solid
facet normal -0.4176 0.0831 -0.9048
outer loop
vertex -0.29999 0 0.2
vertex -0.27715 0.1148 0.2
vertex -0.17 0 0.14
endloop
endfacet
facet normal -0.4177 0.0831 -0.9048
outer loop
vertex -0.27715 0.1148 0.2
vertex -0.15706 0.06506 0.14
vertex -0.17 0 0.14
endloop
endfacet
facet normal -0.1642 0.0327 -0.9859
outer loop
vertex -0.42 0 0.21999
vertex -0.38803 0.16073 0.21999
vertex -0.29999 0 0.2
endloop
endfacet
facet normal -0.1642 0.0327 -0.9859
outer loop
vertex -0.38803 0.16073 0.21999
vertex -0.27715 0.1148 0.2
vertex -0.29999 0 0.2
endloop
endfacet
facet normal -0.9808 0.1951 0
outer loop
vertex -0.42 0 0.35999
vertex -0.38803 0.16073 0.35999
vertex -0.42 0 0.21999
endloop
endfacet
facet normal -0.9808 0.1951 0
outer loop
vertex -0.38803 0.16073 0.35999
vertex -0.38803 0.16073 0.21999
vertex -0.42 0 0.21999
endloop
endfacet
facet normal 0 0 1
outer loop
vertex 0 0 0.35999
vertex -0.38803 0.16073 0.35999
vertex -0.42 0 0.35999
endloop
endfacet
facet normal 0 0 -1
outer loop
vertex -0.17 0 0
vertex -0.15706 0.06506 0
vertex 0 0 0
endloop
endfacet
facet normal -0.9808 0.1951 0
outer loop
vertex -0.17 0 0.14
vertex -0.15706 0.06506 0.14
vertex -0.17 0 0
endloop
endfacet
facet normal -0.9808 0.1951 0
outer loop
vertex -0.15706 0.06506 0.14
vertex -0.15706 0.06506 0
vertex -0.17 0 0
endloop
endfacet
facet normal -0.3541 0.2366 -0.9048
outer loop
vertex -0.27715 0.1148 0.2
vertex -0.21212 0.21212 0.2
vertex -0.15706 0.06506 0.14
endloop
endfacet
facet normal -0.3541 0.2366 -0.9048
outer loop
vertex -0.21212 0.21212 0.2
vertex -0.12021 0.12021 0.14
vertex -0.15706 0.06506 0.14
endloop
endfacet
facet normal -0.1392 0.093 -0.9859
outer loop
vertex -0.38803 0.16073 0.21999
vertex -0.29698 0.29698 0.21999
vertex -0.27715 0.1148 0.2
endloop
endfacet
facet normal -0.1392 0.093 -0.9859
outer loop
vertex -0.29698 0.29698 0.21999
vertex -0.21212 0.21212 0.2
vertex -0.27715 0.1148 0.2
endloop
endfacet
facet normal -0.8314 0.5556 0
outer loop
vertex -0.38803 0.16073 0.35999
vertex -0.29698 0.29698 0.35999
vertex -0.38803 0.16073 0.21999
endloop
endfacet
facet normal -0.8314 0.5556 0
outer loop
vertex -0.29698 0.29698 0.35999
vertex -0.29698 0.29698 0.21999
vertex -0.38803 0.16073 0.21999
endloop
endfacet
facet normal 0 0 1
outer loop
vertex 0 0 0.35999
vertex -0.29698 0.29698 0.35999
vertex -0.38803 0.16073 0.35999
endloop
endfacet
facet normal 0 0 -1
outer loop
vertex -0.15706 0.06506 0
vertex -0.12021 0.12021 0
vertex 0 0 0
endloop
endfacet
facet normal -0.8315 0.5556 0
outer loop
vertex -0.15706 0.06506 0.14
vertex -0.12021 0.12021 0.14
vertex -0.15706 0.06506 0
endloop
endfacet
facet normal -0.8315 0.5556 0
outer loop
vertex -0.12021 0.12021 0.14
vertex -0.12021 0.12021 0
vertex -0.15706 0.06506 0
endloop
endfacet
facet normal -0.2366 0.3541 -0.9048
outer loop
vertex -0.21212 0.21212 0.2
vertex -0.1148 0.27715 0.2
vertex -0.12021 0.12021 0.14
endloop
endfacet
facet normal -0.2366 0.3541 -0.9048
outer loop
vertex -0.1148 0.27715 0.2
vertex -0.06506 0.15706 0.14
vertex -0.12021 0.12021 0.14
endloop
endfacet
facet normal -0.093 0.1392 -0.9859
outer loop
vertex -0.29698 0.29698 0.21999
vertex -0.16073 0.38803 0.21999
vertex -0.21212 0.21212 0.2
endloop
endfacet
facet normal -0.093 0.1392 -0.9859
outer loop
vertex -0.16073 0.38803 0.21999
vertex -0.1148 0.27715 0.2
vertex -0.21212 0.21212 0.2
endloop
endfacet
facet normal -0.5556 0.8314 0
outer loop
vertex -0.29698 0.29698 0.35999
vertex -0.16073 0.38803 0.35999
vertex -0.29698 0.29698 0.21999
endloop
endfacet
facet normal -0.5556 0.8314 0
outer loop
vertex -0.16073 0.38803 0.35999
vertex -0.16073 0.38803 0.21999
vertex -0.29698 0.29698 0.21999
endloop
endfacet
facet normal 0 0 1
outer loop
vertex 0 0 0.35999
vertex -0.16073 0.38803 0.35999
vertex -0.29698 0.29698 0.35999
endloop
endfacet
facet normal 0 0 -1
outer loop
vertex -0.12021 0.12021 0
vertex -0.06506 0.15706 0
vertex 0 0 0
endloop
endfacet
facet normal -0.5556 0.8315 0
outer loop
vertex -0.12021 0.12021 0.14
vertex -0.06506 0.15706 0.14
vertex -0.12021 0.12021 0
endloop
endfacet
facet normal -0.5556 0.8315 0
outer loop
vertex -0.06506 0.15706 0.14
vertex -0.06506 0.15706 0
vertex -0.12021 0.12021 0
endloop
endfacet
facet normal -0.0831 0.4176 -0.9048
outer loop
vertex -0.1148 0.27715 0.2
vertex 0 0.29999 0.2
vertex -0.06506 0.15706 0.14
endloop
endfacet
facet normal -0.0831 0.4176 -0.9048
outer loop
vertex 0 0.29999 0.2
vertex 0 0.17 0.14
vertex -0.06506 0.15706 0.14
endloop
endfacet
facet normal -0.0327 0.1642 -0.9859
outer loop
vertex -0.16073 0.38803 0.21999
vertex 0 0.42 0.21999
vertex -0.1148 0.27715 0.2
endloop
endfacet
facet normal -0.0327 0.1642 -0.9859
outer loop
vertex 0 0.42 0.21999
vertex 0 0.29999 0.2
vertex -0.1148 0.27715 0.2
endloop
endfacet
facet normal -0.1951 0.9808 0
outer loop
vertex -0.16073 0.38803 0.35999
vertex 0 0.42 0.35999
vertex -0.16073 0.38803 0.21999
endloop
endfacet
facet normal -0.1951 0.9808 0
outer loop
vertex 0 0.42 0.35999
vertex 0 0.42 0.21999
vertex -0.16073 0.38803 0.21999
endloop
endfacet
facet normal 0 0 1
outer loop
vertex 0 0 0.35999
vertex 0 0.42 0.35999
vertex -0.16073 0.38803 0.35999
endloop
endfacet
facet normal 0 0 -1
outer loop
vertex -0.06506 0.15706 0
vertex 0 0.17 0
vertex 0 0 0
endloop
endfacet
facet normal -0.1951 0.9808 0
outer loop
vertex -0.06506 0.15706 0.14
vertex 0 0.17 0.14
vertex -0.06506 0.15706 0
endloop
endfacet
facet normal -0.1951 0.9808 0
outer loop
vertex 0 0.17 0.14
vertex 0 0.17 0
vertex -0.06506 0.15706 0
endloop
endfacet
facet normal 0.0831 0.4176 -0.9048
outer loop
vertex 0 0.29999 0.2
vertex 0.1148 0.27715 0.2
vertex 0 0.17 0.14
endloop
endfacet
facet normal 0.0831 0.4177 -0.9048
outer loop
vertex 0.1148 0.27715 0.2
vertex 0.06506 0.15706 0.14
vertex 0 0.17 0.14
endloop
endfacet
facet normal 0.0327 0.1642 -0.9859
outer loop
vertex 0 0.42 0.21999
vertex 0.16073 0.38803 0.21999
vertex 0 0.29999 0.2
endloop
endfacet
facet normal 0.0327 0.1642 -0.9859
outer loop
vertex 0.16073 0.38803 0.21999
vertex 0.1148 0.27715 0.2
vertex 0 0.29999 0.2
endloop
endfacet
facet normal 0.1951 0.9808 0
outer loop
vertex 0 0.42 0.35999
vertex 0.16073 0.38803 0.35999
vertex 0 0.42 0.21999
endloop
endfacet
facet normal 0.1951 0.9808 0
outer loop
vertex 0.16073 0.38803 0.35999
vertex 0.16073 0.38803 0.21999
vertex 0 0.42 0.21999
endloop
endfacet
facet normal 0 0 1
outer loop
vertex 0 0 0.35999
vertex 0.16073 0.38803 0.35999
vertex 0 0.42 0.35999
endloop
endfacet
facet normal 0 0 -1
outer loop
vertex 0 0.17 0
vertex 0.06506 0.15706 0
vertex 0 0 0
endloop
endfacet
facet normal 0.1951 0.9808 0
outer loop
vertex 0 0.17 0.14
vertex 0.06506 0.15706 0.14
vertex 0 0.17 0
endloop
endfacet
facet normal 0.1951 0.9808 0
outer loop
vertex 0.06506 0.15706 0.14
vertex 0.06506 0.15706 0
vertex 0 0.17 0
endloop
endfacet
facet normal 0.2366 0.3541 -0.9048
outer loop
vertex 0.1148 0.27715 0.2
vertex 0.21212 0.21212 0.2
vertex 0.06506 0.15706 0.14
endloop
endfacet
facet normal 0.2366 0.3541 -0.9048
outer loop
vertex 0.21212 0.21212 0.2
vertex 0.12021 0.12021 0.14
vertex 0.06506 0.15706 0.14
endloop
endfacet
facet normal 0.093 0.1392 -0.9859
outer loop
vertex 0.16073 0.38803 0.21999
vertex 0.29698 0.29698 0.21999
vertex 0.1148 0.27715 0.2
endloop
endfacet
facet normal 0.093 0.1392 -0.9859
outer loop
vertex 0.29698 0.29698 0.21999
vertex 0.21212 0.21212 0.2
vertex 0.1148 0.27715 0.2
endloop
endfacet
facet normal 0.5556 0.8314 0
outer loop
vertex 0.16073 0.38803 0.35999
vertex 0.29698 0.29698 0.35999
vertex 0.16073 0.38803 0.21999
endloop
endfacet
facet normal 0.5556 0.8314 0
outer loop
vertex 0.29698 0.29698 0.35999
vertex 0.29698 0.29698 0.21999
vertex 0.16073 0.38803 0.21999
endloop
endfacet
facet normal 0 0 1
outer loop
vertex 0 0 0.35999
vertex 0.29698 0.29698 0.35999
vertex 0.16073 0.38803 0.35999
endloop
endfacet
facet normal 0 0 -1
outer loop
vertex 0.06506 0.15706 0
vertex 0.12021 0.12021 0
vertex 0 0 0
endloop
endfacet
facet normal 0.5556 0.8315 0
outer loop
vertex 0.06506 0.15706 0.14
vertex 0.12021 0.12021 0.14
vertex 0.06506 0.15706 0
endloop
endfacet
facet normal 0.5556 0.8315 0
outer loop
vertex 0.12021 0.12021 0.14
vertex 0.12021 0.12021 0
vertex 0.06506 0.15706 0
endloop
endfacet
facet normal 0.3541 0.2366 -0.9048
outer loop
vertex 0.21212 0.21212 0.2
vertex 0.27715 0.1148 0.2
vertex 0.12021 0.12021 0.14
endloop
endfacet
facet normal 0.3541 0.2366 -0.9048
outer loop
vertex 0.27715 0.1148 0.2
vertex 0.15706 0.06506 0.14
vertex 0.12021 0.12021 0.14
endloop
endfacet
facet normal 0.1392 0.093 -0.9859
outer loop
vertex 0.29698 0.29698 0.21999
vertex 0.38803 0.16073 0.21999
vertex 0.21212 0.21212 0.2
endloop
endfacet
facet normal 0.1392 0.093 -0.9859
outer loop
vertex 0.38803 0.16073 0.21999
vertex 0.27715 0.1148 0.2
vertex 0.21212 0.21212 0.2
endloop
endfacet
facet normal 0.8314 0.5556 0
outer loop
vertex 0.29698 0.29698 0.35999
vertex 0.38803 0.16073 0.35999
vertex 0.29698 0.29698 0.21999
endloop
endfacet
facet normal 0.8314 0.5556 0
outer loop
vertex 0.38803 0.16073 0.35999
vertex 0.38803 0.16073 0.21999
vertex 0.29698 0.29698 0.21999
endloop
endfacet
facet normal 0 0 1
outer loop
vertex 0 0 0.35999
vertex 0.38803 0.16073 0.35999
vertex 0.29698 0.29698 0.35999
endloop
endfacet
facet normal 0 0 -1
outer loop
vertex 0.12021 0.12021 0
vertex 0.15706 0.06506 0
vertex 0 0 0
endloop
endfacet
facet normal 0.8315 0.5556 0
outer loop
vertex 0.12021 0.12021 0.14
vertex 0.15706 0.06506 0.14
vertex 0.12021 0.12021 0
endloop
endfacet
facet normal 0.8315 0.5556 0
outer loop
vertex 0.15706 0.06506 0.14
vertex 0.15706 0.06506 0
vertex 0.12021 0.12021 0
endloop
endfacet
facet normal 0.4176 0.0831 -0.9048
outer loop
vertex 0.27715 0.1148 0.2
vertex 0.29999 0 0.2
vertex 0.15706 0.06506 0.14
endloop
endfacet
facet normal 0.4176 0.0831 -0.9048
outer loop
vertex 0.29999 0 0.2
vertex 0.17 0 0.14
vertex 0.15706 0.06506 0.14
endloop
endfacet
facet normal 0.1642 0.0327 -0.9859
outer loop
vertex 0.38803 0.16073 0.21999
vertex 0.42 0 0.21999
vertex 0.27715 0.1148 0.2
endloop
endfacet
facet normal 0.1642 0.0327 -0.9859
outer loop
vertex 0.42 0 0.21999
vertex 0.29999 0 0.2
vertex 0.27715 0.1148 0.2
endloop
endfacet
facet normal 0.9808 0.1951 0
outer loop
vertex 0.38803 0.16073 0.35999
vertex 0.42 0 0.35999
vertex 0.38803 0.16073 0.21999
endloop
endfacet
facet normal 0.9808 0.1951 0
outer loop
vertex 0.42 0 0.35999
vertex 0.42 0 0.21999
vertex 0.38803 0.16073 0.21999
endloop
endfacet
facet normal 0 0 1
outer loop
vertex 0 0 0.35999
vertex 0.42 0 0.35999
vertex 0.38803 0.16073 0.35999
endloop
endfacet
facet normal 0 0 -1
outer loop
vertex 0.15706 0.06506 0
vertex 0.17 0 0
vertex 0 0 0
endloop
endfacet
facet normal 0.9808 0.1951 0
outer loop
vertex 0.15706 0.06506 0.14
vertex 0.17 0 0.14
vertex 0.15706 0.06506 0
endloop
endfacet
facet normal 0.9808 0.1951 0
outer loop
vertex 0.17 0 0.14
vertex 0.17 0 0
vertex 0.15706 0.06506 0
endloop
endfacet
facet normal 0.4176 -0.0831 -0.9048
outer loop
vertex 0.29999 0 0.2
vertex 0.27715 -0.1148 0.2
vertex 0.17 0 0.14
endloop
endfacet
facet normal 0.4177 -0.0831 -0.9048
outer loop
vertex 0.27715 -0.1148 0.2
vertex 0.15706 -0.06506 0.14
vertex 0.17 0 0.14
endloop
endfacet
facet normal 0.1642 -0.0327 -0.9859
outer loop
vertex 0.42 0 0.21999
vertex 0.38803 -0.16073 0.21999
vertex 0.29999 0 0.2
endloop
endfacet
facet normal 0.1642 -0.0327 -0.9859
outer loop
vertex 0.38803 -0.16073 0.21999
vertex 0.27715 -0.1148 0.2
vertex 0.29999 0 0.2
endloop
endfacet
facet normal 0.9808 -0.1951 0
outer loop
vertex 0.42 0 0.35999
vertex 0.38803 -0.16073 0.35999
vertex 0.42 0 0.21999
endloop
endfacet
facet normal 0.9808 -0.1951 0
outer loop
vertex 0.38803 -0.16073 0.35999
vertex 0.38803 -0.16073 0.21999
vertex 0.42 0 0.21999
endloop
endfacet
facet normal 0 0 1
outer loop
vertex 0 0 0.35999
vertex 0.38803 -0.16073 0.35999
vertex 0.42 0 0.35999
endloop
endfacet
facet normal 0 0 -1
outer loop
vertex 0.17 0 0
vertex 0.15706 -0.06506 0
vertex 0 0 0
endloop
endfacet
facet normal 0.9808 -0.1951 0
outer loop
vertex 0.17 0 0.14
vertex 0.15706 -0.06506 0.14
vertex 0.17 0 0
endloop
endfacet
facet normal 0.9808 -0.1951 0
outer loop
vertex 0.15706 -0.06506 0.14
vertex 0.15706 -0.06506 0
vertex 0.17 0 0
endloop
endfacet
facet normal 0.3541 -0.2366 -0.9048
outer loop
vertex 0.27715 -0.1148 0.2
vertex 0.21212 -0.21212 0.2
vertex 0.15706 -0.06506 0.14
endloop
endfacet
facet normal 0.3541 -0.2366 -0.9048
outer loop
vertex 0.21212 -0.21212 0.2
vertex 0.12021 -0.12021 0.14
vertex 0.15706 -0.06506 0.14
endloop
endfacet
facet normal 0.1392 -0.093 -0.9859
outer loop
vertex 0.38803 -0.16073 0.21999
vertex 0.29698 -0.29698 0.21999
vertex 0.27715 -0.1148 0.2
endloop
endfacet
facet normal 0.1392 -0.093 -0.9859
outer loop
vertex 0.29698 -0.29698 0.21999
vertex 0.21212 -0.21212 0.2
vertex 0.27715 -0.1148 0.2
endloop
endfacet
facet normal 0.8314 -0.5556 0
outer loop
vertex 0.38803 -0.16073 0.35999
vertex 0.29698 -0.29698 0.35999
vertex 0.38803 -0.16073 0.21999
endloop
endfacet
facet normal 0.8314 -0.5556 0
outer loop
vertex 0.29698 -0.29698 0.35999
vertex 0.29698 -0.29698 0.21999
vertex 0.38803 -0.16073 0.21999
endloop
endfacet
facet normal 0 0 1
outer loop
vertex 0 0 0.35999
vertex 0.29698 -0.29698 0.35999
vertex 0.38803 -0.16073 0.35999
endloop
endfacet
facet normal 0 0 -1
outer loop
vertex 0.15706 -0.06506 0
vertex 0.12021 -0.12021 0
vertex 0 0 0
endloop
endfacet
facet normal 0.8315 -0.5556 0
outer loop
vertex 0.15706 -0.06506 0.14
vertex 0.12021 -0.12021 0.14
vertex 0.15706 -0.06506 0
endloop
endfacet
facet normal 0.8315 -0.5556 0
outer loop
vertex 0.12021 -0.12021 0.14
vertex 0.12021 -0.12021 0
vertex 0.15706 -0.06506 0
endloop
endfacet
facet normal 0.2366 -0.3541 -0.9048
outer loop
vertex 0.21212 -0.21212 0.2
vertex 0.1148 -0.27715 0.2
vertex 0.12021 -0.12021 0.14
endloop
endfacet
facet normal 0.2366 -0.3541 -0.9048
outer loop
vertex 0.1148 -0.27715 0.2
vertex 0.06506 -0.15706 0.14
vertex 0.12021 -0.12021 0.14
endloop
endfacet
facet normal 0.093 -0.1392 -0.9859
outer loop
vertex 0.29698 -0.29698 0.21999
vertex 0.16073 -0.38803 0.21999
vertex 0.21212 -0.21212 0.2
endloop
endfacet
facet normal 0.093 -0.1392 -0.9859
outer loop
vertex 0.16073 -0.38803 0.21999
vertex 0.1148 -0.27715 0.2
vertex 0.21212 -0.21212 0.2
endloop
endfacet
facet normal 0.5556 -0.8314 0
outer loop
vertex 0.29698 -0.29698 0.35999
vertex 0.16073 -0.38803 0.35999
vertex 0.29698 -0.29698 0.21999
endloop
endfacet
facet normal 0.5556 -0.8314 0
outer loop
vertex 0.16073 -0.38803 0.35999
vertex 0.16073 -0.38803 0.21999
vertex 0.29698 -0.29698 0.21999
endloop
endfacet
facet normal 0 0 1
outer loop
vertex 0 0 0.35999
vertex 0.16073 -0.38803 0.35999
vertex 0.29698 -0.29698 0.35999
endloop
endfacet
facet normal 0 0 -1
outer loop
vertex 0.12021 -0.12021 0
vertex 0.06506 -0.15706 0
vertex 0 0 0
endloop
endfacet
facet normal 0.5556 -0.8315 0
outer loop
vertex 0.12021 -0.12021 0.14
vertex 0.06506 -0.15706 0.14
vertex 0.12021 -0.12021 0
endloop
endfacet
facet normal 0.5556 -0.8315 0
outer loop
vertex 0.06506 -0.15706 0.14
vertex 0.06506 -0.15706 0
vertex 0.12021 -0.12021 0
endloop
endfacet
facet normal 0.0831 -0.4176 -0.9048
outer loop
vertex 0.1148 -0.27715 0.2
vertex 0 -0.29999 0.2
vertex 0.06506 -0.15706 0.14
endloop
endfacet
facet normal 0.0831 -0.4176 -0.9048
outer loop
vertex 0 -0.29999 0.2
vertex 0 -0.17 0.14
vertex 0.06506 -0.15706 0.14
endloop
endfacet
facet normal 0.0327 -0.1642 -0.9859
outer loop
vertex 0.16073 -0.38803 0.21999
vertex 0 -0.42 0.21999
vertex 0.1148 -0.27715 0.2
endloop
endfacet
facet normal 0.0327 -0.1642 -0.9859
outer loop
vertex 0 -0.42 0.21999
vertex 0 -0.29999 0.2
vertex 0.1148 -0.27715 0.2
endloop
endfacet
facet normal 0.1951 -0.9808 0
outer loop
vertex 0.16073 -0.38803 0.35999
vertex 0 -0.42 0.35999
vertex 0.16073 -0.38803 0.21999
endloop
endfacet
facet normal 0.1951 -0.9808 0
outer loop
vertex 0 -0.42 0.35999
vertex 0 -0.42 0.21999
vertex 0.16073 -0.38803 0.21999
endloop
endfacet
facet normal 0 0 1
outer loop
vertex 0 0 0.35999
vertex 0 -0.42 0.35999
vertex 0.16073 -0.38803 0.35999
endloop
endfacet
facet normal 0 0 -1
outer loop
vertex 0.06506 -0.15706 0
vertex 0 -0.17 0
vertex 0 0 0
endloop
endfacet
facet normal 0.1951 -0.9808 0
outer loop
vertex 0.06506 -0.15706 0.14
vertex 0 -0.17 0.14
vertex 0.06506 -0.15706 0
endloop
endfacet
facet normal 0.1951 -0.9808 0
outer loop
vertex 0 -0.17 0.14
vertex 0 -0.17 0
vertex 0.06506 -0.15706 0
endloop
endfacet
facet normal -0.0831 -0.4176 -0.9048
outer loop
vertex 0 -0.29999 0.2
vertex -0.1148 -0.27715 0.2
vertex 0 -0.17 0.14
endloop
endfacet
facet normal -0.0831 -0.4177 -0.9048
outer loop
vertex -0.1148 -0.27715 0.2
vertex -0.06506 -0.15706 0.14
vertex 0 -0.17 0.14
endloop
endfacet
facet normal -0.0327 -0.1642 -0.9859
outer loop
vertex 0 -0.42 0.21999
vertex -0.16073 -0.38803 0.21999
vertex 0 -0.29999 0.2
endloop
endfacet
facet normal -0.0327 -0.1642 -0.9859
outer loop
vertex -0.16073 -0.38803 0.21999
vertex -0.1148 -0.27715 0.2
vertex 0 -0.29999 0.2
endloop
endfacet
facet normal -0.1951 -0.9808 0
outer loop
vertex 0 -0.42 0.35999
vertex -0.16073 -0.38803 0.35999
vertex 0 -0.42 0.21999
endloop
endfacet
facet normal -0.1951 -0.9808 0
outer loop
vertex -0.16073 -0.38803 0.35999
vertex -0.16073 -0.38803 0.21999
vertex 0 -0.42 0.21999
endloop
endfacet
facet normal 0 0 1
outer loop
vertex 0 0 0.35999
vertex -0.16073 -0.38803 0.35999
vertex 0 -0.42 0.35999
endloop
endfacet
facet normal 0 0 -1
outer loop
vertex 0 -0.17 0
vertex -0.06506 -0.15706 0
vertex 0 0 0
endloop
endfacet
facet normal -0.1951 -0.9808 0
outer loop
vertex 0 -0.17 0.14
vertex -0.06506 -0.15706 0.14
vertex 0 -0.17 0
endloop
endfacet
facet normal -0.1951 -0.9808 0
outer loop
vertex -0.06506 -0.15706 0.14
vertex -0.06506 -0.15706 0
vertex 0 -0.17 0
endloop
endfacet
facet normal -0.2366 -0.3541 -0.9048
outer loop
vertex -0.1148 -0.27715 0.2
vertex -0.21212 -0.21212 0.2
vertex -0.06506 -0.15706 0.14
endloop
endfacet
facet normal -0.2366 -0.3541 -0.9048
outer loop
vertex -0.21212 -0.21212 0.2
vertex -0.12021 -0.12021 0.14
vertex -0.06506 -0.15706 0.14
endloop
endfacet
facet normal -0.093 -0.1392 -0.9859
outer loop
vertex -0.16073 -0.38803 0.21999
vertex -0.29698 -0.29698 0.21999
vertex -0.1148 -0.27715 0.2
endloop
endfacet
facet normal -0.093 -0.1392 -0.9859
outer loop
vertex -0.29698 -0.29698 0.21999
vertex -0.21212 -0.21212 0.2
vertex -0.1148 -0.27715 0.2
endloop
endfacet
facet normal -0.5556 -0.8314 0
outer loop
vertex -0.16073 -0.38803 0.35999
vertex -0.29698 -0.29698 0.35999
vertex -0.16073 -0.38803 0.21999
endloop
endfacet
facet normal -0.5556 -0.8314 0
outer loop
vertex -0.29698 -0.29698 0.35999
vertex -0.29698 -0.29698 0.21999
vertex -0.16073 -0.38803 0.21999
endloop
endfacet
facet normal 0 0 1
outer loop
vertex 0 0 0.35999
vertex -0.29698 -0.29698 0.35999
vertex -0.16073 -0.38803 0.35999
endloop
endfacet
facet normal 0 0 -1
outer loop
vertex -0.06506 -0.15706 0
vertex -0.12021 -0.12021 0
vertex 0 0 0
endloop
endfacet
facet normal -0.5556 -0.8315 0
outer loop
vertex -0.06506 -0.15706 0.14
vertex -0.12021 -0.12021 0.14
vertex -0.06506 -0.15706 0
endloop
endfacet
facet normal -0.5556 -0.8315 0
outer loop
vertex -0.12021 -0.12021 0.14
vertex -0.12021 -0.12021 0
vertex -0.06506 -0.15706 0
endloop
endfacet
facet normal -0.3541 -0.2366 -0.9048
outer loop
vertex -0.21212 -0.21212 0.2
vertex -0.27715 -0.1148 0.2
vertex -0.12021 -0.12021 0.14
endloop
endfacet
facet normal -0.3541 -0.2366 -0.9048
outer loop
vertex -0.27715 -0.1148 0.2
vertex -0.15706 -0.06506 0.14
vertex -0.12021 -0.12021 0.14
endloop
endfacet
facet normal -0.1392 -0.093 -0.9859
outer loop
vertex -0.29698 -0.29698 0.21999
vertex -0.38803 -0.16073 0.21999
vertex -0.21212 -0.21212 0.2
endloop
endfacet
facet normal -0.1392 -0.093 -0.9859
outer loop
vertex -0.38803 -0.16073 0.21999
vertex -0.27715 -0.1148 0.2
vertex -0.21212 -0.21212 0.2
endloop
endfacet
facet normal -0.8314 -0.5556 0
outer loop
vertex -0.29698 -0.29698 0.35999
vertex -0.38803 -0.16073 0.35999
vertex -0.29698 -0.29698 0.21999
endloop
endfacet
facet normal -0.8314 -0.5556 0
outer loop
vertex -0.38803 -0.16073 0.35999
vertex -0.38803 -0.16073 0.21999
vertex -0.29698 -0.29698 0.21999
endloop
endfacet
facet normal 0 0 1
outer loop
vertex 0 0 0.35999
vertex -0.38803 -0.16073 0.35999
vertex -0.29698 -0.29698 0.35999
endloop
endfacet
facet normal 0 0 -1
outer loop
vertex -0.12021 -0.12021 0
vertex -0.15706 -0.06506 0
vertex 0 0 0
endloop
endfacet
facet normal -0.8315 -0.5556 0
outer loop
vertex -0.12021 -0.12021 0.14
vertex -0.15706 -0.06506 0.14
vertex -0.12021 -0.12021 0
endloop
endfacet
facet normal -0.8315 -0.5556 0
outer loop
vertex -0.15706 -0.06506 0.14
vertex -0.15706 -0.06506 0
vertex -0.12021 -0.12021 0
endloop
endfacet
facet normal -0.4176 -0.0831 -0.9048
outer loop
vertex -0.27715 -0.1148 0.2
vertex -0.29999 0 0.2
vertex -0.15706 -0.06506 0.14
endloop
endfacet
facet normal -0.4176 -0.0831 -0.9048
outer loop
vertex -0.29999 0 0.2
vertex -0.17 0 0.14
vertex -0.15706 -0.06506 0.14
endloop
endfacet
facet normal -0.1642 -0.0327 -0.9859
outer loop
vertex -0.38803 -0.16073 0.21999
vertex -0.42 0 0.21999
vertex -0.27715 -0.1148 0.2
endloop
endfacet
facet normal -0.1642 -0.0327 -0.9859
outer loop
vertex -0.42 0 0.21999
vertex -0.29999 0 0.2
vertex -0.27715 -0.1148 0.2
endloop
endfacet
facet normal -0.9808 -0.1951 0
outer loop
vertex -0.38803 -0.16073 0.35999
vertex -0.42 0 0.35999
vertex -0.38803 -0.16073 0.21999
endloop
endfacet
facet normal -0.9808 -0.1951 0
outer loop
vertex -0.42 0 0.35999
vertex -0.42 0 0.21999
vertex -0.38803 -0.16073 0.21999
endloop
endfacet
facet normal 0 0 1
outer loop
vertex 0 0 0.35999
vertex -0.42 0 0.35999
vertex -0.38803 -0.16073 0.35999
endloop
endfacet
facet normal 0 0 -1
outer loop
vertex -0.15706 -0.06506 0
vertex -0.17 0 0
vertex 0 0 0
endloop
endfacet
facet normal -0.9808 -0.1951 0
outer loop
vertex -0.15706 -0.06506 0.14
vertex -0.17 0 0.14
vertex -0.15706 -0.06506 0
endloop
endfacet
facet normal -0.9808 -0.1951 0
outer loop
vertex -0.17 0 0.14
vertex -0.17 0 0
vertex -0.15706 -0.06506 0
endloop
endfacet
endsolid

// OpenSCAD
// Carousel Autoloader 0.2.23 - rammer head (ramkop) on unit calibre, pushing toward +z.
// Pusher plate (radius 0.42 d) on a conical boss and rod stub. Every dimension is at least 0.3 d.
rotate_extrude($fn = 16)
  polygon([[0,0],[0.17,0],[0.17,0.14],[0.30,0.20],[0.42,0.22],[0.42,0.36],[0,0.36]]);
